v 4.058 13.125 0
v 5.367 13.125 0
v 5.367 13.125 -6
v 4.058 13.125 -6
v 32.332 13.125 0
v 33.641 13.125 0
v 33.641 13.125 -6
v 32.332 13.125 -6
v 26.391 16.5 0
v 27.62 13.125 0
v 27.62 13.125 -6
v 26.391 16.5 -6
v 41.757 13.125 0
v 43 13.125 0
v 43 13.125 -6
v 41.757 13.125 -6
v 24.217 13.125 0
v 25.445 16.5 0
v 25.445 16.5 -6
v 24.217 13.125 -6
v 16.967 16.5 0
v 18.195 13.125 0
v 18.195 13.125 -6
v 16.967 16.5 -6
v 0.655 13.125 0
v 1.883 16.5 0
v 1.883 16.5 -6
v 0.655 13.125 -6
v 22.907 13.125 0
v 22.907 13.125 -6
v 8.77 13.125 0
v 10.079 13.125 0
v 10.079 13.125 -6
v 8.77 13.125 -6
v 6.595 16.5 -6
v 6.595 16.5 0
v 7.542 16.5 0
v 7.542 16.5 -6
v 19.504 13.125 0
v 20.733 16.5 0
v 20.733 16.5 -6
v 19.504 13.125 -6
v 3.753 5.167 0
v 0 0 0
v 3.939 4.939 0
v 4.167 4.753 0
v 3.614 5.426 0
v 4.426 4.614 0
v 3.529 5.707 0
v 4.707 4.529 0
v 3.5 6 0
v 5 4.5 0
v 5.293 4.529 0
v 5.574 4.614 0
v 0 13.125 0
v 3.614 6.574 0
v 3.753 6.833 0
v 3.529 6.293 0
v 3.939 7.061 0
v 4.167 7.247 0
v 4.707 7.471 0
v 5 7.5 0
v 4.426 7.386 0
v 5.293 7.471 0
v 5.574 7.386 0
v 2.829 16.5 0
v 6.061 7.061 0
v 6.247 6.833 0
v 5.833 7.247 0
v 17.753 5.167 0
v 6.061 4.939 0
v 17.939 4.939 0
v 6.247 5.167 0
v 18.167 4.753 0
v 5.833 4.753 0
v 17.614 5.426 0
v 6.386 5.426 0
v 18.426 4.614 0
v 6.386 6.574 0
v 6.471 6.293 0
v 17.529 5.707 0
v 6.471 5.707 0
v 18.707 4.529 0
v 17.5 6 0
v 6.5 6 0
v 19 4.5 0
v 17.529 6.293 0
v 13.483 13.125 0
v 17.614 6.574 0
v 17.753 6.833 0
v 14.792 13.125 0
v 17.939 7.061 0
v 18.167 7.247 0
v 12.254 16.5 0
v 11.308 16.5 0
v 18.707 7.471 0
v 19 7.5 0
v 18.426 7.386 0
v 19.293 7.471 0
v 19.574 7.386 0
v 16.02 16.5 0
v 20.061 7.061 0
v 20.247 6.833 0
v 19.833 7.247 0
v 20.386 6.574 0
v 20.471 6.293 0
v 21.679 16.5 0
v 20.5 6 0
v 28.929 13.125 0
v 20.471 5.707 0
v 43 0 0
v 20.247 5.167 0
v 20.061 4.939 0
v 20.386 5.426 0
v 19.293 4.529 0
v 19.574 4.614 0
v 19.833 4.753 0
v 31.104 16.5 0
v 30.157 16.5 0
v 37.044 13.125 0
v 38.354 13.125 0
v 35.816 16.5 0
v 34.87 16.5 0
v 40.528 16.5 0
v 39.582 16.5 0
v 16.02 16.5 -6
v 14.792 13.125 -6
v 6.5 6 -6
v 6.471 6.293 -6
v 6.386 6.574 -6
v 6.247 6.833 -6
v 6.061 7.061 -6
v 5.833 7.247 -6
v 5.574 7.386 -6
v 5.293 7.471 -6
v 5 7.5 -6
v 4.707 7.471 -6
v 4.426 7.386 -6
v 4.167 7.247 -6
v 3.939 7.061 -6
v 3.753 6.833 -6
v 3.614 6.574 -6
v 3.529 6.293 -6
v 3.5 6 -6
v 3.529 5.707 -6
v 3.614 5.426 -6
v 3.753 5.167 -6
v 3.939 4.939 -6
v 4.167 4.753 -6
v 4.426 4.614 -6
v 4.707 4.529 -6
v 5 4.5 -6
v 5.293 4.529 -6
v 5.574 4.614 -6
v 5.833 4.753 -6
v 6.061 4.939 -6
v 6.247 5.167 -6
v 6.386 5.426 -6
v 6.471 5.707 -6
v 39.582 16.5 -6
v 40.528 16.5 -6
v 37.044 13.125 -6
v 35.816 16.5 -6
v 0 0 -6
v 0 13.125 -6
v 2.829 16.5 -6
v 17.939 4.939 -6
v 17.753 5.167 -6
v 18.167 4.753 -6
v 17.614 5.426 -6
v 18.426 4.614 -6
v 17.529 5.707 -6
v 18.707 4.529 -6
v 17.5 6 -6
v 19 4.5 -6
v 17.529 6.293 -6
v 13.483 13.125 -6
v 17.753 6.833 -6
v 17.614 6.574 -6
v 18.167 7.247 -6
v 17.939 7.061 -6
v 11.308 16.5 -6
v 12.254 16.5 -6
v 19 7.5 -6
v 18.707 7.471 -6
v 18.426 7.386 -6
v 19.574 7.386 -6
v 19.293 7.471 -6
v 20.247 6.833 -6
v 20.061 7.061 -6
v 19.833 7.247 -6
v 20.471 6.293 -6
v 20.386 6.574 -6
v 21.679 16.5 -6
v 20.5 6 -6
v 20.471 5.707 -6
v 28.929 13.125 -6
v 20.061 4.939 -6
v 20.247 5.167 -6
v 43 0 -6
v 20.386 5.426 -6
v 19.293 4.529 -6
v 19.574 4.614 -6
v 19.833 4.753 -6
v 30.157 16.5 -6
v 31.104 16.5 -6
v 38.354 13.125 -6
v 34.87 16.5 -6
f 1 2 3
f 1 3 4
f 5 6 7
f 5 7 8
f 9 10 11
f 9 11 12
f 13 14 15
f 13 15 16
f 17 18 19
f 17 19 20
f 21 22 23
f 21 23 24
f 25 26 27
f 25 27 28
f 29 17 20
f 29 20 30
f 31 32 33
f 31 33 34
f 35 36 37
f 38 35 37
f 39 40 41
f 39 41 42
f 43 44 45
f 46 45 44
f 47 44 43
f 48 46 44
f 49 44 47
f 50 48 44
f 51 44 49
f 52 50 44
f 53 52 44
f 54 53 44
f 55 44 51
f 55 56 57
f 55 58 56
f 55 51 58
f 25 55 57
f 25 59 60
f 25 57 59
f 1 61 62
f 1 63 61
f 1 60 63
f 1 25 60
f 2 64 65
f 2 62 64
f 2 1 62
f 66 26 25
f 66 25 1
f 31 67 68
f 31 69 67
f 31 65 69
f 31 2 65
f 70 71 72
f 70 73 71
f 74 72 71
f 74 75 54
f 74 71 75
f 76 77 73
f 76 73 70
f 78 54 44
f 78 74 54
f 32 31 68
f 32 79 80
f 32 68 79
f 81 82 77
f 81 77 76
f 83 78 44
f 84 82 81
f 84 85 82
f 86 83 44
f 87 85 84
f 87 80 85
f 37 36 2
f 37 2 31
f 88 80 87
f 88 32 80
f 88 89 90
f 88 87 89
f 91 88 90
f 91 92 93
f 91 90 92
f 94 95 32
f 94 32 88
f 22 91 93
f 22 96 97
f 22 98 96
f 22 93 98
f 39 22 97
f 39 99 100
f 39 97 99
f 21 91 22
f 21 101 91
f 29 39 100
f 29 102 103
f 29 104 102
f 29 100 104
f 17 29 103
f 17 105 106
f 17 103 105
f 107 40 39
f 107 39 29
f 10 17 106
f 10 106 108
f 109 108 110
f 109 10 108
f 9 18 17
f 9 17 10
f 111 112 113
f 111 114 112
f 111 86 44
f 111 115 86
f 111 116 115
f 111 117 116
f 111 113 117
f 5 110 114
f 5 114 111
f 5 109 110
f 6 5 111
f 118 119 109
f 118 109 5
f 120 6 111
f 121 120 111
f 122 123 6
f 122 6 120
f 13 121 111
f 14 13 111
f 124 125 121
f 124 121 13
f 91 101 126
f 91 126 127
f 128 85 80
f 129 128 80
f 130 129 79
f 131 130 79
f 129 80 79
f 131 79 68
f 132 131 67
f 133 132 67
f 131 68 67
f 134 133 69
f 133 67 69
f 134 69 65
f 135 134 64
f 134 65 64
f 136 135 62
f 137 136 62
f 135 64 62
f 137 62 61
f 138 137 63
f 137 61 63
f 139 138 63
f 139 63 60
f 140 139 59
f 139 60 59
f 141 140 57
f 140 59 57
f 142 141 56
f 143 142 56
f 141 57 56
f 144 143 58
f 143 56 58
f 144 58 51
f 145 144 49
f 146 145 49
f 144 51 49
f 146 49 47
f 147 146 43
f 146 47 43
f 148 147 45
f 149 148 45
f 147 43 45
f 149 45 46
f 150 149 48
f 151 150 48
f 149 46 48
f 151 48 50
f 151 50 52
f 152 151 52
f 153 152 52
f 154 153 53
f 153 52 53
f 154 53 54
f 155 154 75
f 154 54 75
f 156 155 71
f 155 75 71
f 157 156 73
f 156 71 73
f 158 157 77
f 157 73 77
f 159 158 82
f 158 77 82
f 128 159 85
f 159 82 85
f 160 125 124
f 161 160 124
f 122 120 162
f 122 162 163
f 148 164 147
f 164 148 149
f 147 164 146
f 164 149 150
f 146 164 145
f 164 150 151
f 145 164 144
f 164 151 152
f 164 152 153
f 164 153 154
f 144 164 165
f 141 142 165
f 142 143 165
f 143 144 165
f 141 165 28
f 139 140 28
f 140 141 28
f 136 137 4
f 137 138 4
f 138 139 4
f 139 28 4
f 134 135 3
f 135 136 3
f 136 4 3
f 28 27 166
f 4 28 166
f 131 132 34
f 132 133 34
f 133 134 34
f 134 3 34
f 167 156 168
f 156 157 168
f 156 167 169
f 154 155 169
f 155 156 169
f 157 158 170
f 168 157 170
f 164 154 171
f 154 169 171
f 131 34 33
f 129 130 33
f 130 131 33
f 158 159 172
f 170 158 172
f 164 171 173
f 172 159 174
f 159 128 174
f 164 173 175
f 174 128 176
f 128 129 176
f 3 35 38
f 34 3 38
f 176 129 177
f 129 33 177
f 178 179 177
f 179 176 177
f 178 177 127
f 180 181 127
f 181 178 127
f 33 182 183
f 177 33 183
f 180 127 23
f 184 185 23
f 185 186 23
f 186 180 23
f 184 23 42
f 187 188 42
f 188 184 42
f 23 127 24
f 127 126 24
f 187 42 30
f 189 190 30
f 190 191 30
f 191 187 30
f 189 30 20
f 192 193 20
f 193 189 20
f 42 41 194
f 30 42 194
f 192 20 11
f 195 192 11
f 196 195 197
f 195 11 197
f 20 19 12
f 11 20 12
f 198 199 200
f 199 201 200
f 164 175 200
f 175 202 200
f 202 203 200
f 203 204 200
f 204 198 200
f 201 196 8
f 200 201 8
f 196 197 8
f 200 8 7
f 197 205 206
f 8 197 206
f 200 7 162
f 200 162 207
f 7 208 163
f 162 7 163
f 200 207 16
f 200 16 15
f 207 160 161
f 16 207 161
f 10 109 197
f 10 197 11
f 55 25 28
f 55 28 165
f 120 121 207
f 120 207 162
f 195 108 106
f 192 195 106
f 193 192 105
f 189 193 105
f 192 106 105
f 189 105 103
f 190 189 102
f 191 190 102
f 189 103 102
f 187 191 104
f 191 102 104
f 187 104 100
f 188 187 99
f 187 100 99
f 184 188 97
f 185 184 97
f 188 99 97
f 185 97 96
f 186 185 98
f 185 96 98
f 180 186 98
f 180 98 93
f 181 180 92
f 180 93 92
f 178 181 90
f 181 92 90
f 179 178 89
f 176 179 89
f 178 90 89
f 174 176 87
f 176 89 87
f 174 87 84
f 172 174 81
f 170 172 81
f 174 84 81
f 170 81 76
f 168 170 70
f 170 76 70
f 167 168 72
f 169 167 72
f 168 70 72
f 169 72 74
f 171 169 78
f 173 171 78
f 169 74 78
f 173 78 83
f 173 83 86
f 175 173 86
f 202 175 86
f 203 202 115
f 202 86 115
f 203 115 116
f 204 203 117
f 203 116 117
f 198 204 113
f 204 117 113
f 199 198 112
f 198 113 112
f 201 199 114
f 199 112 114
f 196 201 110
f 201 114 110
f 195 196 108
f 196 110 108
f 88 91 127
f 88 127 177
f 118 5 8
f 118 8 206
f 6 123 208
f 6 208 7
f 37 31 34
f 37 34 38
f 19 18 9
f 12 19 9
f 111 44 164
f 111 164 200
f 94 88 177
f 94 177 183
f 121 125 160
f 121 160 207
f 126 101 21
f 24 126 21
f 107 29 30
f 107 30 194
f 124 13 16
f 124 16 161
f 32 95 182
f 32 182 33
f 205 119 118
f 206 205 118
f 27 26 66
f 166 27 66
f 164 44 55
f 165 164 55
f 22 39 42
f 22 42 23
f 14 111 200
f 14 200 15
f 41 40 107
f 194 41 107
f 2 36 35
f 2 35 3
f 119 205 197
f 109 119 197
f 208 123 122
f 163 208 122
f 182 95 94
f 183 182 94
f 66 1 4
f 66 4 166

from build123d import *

# Parameters (mm, degrees)
BLANKSKE_W              = 43
BLANKSKE_H              = 16.5
BLANK_DEPTH             = 6
TOOTHCUTSIM_DEPTH       = 47.446205442
TEETHCUTS_COUNT         = 10
TEETHCUTS_PITCH         = 4.712388975
ESQUISSE1_R             = 1.5
ENL_V_MAT_EXTRU_1_DEPTH = 6


with BuildPart() as part:
    # BlankSke → Blank (new body)
    with BuildSketch(Plane.XY):
        with Locations((21.5, 8.25)):
            Rectangle(BLANKSKE_W, BLANKSKE_H)
    extrude(amount=-BLANK_DEPTH)

    # TooCutSkeSim → ToothCutSim (cut, through all)
    with BuildSketch(Plane.XY):
        Polygon((0.654653055, 13.125), (-0.654653055, 13.125), (-1.892297439, 16.5254), (1.892297439, 16.5254), align=None)
    toothcutsim = extrude(amount=-TOOTHCUTSIM_DEPTH, mode=Mode.SUBTRACT)

    # TeethCuts: ToothCutSim ×10
    with Locations(*[(i * TEETHCUTS_PITCH, 0, 0) for i in range(1, TEETHCUTS_COUNT)]):
        add(toothcutsim, mode=Mode.SUBTRACT)

    # Esquisse1 → Enlèv. mat.-Extru.1 (cut)
    with BuildSketch(Plane.XY):
        with Locations((5, 6)):
            Circle(ESQUISSE1_R)
        with Locations((19, 6)):
            Circle(ESQUISSE1_R)
    extrude(amount=-ENL_V_MAT_EXTRU_1_DEPTH, mode=Mode.SUBTRACT)


solid = part.part
